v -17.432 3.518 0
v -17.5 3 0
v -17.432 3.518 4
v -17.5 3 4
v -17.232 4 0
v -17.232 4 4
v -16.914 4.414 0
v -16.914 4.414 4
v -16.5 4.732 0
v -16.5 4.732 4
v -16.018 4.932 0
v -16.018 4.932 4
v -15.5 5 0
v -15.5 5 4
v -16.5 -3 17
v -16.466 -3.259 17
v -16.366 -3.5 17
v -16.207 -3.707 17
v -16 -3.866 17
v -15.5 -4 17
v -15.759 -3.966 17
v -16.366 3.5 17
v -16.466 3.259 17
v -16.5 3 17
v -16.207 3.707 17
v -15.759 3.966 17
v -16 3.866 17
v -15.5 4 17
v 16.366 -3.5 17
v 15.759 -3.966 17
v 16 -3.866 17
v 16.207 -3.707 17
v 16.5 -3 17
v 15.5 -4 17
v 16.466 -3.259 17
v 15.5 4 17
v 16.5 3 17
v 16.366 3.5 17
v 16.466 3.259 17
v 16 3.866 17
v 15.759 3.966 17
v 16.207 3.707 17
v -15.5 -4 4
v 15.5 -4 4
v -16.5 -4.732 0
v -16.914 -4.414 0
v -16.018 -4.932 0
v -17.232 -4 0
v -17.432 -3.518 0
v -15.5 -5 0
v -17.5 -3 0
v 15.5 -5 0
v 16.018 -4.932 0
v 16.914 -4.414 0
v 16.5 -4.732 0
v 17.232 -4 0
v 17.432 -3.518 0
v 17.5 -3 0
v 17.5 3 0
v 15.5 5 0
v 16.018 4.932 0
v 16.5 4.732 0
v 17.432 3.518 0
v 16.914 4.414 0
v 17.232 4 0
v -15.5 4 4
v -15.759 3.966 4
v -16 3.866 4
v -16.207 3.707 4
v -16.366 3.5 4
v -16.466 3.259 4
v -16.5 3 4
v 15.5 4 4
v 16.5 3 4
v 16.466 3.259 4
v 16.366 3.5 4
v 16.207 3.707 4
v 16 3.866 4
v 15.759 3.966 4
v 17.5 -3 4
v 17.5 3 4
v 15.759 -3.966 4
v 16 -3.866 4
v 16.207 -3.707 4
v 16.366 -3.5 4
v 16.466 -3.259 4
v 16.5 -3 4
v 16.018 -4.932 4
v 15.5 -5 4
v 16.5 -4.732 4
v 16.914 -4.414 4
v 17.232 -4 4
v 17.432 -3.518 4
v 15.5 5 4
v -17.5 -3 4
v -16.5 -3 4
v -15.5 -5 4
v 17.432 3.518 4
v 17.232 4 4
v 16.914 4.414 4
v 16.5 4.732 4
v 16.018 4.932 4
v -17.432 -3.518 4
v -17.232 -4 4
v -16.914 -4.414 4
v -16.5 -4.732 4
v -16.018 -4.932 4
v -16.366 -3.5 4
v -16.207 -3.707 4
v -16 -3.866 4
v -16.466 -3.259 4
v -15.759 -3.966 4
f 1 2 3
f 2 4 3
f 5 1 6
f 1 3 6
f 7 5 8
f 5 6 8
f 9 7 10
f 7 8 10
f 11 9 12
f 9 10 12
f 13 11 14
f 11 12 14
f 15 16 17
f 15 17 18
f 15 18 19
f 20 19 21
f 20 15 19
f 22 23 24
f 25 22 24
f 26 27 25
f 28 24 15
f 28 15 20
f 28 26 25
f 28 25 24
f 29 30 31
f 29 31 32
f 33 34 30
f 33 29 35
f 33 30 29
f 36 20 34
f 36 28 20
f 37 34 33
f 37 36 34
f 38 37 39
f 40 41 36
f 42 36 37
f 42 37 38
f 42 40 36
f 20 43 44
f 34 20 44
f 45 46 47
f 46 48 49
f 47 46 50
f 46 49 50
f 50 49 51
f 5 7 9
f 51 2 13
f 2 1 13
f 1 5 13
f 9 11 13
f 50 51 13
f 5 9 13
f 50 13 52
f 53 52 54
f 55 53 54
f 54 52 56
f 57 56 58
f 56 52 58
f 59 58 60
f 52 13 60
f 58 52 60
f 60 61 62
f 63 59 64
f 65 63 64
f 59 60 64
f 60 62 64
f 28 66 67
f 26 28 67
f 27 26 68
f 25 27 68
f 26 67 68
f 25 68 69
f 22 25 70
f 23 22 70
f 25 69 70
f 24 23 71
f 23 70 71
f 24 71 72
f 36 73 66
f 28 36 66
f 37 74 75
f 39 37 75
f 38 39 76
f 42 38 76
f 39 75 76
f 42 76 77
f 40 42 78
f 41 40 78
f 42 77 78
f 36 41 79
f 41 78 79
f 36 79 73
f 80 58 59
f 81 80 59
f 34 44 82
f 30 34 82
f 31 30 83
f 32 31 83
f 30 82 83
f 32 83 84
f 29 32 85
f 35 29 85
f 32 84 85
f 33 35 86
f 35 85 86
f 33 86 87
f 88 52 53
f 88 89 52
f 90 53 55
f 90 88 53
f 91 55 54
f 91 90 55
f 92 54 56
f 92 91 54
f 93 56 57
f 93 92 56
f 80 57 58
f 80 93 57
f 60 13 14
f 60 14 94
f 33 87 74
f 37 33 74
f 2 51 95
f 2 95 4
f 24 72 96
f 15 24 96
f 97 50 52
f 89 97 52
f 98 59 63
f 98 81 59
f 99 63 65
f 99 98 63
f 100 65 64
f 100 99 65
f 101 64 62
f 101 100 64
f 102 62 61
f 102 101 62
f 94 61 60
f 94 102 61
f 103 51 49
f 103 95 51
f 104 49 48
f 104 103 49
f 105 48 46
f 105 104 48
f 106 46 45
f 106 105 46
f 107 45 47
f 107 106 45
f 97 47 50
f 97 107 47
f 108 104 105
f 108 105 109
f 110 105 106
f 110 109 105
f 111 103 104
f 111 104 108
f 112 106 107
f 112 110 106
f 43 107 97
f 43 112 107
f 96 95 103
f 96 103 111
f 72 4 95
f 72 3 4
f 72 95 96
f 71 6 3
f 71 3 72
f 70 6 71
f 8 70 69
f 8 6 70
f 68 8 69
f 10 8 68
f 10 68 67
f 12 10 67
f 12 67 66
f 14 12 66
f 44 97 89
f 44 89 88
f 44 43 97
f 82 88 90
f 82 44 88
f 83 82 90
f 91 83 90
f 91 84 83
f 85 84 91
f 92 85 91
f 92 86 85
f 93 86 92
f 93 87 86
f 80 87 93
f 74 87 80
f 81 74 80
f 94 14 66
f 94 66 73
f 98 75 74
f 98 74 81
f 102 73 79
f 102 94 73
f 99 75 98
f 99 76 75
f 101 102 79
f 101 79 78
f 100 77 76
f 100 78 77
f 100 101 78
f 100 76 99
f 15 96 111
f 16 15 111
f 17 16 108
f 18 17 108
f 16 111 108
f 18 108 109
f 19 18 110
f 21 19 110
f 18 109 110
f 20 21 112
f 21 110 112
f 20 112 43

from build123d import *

# Parameters (mm, degrees)
SKETCH2_W           = 35
SKETCH2_H           = 10
BOSS_EXTRUDE1_DEPTH = 4
FILLET1_R           = 2
BOSS_EXTRUDE2_DEPTH = 13


with BuildPart() as part:
    # Sketch2 → Boss-Extrude1 (new body)
    with BuildSketch(Plane.XY):
        Rectangle(SKETCH2_W, SKETCH2_H)
    extrude(amount=BOSS_EXTRUDE1_DEPTH)

    # Fillet1
    fillet1_edges = [part.edges().sort_by_distance(p)[0] for p in [
        (17.5, -5, 2),
        (-17.5, -5, 2),
        (-17.5, 5, 2),
        (17.5, 5, 2),
    ]]
    fillet(fillet1_edges, radius=FILLET1_R)

    # Sketch3 → Boss-Extrude2 (add)
    with BuildSketch(Plane.XY.offset(4)):
        with BuildLine():
            Line((-16.5, 3), (-16.5, -3))
            ThreePointArc((-16.5, -3), (-16.207106781, -3.707106781), (-15.5, -4))
            Line((-15.5, -4), (15.5, -4))
            ThreePointArc((15.5, -4), (16.207106781, -3.707106781), (16.5, -3))
            Line((16.5, -3), (16.5, 3))
            ThreePointArc((16.5, 3), (16.207106781, 3.707106781), (15.5, 4))
            Line((15.5, 4), (-15.5, 4))
            ThreePointArc((-15.5, 4), (-16.207106781, 3.707106781), (-16.5, 3))
        make_face()
    extrude(amount=BOSS_EXTRUDE2_DEPTH)


solid = part.part
